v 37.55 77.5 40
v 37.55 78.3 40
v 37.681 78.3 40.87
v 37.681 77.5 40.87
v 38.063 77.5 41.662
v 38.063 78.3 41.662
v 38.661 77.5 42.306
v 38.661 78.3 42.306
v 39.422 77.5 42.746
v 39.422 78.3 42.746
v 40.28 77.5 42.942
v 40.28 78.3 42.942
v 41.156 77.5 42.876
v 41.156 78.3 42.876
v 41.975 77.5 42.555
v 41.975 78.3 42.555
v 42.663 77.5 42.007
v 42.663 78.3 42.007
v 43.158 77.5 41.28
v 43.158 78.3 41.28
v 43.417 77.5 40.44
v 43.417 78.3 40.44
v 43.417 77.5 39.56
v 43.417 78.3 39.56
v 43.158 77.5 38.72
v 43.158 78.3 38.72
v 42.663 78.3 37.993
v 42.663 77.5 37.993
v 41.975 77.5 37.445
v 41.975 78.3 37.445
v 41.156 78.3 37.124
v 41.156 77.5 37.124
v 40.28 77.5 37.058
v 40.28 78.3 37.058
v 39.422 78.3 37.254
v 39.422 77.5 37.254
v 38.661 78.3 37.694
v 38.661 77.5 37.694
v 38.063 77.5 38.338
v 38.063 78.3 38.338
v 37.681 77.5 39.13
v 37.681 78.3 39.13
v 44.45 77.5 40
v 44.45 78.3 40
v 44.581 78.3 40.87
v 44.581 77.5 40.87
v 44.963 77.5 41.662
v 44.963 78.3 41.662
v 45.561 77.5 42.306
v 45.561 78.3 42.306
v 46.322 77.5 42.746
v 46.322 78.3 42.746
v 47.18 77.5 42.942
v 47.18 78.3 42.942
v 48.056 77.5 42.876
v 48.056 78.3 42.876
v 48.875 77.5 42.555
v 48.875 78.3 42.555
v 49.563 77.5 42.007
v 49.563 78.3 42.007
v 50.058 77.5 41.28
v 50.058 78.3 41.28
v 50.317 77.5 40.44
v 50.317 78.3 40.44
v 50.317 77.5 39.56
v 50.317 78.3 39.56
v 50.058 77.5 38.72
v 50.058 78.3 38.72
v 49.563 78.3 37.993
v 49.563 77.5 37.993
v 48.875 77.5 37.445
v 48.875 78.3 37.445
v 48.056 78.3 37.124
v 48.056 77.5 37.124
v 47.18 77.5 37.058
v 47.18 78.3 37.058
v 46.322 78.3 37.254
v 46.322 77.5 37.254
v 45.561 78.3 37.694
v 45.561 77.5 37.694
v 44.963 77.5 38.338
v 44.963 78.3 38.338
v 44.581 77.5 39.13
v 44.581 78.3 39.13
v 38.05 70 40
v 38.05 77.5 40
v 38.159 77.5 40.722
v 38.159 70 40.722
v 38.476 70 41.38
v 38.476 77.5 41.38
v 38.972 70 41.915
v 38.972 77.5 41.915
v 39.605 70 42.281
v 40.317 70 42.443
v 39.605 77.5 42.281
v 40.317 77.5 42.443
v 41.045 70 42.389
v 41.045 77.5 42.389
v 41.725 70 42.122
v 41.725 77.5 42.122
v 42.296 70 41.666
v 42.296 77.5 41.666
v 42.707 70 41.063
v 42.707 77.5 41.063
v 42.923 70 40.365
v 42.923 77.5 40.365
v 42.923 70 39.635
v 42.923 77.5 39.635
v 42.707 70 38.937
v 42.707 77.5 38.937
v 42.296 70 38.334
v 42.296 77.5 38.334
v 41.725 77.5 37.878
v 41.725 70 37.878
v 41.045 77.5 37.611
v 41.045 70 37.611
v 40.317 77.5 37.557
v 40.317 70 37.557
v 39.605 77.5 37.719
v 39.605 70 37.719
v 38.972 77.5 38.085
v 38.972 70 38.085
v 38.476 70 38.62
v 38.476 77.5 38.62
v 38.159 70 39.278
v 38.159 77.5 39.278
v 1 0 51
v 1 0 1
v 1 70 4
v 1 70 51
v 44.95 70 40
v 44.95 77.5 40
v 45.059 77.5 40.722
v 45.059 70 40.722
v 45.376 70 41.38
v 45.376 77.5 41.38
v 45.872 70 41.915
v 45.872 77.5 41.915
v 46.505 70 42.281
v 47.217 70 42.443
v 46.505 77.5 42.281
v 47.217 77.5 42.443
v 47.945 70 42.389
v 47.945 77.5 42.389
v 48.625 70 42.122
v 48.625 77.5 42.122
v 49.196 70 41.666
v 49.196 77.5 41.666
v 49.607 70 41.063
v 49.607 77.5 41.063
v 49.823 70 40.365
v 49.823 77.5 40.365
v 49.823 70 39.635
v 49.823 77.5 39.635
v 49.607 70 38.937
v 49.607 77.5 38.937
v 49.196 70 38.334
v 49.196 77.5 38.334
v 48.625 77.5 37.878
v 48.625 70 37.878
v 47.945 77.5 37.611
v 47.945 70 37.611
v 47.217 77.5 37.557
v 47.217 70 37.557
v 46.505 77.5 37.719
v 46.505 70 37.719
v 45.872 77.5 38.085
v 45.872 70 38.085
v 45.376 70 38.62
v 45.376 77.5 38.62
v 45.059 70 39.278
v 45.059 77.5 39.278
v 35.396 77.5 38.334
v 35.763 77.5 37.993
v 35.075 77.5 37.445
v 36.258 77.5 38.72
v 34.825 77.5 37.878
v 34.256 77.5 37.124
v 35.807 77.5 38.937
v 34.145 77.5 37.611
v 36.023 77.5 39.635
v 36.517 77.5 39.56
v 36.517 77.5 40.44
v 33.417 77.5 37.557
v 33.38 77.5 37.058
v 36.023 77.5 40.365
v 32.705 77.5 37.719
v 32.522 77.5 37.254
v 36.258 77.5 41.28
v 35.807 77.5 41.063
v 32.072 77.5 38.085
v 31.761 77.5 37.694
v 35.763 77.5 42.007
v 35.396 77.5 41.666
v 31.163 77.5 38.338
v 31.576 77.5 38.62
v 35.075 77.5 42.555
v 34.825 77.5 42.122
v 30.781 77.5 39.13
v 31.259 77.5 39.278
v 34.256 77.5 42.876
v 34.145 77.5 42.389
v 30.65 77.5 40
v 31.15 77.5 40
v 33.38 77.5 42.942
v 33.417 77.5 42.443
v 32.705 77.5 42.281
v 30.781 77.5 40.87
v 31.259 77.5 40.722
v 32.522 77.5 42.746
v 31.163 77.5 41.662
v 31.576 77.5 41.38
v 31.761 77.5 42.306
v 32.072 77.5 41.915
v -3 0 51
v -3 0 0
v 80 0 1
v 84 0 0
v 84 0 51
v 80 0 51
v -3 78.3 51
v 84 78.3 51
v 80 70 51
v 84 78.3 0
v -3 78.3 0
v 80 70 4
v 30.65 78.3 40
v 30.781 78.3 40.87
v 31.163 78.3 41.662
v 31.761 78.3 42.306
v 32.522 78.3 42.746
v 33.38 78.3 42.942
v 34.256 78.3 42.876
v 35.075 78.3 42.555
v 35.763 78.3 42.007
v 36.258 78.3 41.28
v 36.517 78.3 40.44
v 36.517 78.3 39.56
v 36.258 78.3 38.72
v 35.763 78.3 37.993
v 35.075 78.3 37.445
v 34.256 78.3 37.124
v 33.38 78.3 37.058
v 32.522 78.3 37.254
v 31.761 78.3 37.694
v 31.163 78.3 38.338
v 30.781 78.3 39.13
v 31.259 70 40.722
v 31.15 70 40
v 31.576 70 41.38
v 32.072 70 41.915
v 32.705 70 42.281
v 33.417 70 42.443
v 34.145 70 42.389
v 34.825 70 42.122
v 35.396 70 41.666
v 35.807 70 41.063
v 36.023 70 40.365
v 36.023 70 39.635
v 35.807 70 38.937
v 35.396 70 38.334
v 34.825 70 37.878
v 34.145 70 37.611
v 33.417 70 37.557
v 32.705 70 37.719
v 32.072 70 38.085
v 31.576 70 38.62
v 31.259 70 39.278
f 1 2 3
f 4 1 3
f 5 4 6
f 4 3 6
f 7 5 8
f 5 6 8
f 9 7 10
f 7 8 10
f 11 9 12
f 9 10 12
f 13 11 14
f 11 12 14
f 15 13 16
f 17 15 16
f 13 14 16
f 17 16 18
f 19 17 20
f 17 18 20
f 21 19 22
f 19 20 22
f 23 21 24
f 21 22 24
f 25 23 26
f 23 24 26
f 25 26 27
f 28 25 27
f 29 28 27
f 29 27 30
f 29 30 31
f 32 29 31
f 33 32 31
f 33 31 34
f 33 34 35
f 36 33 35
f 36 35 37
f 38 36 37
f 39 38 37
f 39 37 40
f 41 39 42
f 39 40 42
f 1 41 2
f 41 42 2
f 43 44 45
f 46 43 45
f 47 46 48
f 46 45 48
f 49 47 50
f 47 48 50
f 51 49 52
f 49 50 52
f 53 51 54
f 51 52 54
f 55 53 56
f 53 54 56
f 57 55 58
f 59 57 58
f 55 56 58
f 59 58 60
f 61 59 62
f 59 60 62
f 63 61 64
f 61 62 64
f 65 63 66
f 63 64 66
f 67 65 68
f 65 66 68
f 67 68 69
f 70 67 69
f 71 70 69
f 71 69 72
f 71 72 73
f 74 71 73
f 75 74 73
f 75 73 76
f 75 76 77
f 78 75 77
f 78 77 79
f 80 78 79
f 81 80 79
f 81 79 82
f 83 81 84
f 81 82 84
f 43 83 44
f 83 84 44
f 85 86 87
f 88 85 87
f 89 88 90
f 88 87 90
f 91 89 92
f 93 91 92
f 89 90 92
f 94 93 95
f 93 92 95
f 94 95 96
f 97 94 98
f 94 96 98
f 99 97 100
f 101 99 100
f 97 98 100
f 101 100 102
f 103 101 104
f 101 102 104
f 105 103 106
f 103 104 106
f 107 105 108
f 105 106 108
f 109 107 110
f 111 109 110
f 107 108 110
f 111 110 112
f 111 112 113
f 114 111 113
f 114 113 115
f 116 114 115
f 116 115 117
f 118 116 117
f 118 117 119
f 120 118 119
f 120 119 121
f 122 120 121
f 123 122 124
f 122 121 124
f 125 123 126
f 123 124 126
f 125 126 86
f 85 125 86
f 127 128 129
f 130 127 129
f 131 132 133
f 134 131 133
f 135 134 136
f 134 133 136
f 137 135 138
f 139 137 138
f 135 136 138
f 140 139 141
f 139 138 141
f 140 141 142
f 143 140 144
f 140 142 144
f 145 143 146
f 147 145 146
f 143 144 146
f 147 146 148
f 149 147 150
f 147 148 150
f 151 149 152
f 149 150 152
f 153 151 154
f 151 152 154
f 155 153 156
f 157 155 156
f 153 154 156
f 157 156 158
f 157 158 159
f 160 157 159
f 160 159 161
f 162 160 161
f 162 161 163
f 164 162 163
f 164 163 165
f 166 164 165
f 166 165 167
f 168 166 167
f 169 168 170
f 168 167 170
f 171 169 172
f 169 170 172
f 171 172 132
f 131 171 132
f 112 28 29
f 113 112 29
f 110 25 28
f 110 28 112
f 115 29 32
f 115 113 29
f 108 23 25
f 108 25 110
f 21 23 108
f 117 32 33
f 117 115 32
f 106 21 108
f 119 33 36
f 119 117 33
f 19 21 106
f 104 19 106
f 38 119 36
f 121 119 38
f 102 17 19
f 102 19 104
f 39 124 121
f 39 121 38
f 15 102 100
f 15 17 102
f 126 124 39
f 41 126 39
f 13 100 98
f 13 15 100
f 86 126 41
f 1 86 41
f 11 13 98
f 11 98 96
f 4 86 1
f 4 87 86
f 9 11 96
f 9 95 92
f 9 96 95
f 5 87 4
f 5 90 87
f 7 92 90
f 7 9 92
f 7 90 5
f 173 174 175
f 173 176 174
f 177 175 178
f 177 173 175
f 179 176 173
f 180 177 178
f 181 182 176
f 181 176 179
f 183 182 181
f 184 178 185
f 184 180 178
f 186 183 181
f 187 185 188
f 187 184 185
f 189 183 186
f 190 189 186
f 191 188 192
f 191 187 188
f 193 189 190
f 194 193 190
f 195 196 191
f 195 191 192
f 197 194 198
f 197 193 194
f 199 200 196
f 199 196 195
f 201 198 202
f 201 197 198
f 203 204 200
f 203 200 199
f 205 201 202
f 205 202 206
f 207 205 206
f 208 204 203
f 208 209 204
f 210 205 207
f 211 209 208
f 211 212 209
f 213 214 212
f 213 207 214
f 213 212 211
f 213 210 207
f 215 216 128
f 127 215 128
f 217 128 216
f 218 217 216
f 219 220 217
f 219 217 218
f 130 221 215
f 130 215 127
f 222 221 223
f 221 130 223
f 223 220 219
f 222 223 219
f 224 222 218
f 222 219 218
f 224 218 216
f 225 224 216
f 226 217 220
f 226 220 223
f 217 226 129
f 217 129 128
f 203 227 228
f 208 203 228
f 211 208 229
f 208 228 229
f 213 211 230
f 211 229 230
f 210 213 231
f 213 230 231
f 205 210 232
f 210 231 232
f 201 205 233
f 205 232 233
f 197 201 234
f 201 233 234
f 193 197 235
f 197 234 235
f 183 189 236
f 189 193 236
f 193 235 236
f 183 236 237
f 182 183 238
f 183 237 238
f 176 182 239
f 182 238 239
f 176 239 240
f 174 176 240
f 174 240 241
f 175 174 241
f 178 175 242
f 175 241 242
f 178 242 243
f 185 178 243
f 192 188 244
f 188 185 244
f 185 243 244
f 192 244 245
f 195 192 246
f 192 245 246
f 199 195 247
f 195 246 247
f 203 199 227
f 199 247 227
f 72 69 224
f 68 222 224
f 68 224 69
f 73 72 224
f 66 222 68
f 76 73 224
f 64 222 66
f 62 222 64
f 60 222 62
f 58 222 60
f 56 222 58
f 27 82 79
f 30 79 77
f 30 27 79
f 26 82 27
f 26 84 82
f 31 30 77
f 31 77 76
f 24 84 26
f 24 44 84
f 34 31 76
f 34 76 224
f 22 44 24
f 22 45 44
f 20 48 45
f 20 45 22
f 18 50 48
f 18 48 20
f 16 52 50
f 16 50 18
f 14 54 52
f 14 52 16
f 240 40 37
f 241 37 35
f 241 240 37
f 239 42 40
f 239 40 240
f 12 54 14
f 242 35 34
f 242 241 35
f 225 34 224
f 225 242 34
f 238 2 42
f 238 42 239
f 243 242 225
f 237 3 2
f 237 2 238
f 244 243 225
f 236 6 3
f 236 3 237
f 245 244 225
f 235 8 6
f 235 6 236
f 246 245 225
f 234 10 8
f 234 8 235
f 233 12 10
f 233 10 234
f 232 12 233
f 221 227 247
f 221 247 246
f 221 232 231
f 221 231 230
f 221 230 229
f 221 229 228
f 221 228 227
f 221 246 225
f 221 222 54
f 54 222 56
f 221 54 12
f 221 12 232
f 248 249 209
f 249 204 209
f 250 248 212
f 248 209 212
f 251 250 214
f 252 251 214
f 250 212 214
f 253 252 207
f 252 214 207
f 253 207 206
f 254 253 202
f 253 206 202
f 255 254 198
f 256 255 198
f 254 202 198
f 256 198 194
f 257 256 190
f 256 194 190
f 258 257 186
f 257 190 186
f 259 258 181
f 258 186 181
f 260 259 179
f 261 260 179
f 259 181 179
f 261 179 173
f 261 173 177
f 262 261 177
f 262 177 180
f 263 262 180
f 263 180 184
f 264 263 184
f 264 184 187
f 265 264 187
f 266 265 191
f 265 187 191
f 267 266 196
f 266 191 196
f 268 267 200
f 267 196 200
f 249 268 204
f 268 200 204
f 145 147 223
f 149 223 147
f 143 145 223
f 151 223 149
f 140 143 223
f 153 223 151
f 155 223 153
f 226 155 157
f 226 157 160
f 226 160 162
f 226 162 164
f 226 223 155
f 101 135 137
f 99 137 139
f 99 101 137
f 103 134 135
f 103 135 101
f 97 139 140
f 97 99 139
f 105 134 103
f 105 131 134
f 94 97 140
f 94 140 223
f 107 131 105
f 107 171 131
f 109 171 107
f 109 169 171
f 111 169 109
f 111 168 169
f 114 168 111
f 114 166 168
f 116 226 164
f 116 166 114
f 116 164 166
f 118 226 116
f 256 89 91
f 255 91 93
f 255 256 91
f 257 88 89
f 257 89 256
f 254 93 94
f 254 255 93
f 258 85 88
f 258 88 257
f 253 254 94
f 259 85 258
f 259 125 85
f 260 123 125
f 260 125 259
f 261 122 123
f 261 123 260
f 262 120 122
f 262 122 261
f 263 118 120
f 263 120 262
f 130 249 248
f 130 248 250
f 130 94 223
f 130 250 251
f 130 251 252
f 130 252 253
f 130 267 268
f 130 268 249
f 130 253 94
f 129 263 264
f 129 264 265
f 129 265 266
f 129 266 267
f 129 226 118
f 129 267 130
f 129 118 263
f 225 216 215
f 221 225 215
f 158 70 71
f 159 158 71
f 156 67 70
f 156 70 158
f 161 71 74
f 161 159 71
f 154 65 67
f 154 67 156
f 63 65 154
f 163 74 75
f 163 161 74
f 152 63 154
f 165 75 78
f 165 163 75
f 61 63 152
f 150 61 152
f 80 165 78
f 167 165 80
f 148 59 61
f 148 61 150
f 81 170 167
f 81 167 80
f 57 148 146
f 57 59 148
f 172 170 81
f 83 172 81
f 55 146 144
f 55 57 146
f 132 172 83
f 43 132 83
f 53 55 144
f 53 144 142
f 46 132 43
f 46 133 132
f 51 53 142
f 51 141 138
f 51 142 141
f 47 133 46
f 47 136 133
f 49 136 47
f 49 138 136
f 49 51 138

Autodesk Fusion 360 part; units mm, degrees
sketch "Sketch1" plane through (0, 0, 0) normal (0, 0, 1) x (1, 0, 0)
  line L0 (0, 0) -> (81, 0)
  line L1 (81, 0) -> (81, 71)
  line L2 (81, 71) -> (0, 71)
  line L3 (0, 71) -> (0, 0)
  dimension "d1" = 81
  dimension "d2" = 71
extrude "Extrude1" add sketch "Sketch1" along normal blind 1
sketch "Sketch2" plane through (0, 0, 0) normal (1, 0, 0) x (0, 1, 0)
sketch "Sketch3" plane through (0, 0, 1) normal (0, 0, 1) x (-1, 0, 0)
  line L0 (0, -71) -> (0, 0)
  line L1 (0, 0) -> (-81, 0)
  line L2 (-81, 0) -> (-81, -71)
  line L3 (-81, -71) -> (0, -71)
  line L4 (0, -71) -> (-1, -71)
  line L5 (-1, -71) -> (-1, 0)
  line L6 (-1, 0) -> (0, 0)
  line L7 (0, 0) -> (0, -71)
  line L8 (-81, -71) -> (-80, -71)
  line L9 (-80, -71) -> (-80, 0)
  line L10 (-80, 0) -> (-81, 0)
  line L11 (-81, 0) -> (-81, -71)
  line L12 (-1, -71) -> (-80, -71)
  line L13 (-80, -71) -> (-80, -70)
  line L14 (-80, -70) -> (-1, -70)
  line L15 (-1, -70) -> (-1, -71)
  dimension "d5" = 1
  dimension "d6" = 1
  dimension "d7" = 1
extrude "Extrude2" add sketch "Sketch3" along normal blind 50 contours L3 L5 L9 L12 L13 L14 L15
sketch "Sketch4" plane through (0, 0, 1) normal (0, 0, 1) x (-1, 0, 0)
  line L0 (-80, -71) -> (-80, -70)
  line L1 (-80, -70) -> (-1, -70)
  line L2 (-1, -70) -> (-1, -71)
  line L3 (-1, -71) -> (0, -71)
  line L4 (0, -71) -> (0, 0)
  line L5 (0, 0) -> (-81, 0)
  line L6 (-81, 0) -> (-81, -71)
  line L7 (-81, -71) -> (-80, -71)
  line L8 (0, 0) -> (-1, 0)
  line L9 (-1, 0) -> (-1, -71)
  line L10 (-1, -71) -> (0, -71)
  line L11 (0, -71) -> (0, 0)
  dimension "d10" = 1
  dimension "d11" = 71
extrude "Extrude3" add sketch "Sketch4" along normal blind 50 contours L2 L3 L4 L5 L8 L9 L10 L11
sketch "Sketch5" plane through (0, 0, 1) normal (0, 0, 1) x (-1, 0, 0)
  line L0 (-1, -70) -> (-1, 0)
  line L1 (-1, 0) -> (-81, 0)
  line L2 (-81, 0) -> (-81, -71)
  line L3 (-81, -71) -> (-80, -71)
  line L4 (-80, -71) -> (-80, -70)
  line L5 (-80, -70) -> (-1, -70)
  line L6 (-81, 0) -> (-80, 0)
  line L7 (-80, 0) -> (-80, -71)
  line L8 (-80, -71) -> (-81, -71)
  line L9 (-81, -71) -> (-81, 0)
  dimension "d14" = 71
extrude "Extrude4" add sketch "Sketch5" along normal blind 50 contours L1 L2 L3 L4 L6 L7 L8 L9
sketch "Sketch6" plane through (0, 70, 0) normal (0, -1, 0) x (1, 0, 0)
  line L0 (1, 1) -> (80, 1)
  line L1 (80, 1) -> (80, 51)
  line L2 (80, 51) -> (1, 51)
  line L3 (1, 51) -> (1, 1)
  line L4 (80, 1) -> (80, 4)
  line L5 (1, 4) -> (1, 1)
  dimension "d17" = 79
  dimension "d18" = 3
sketch "Sketch7" plane through (0, 70, 0) normal (0, -1, 0) x (1, 0, 0)
extrude "Extrude5" cut 1 faces at (27.3333, 46.6667, 1) along direction (0, 0, -1) blind 1
sketch "Sketch8" plane through (0, 0, 0) normal (0, 1, 0) x (1, 0, 0)
sketch "Sketch9" plane through (1, 0, 0) normal (1, 0, 0) x (0, 1, 0)
  line L0 (70, 0) -> (70, 51)
  line L1 (70, 51) -> (0, 51)
  line L2 (0, 51) -> (0, 0)
  line L3 (0, 0) -> (70, 0)
  line L4 (0, 0) -> (70, 0)
  line L5 (70, 0) -> (70, 1)
  line L6 (70, 1) -> (0, 1)
  line L7 (0, 1) -> (0, 0)
  dimension "d21" = 70
  dimension "d22" = 1
extrude "Extrude6" add sketch "Sketch9" along normal blind 79 contours L0 L2 L3 L4 L5 L6 L7
sketch "Sketch10" plane through (80, 0, 0) normal (-1, 0, 0) x (0, -1, 0)
  line L0 (-70, 1) -> (0, 1)
  line L1 (0, 1) -> (0, 51)
  line L2 (0, 51) -> (-70, 51)
  line L3 (-70, 51) -> (-70, 1)
  line L4 (-70, 1) -> (-70, 4)
  line L5 (-70, 4) -> (0, 1)
  line L6 (-70, 1) -> (-70, 4)
extrude "Extrude7" add sketch "Sketch10" along normal blind 79 contours L0 L3 L4 L5 L6
sketch "Sketch11" plane through (0, 0, 0) normal (0, 0, 1) x (1, 0, 0)
  line L0 (0, 0) -> (-3, 0)
  line L1 (-3, 0) -> (-3, 74)
  line L2 (-3, 74) -> (0, 74)
  line L3 (0, 74) -> (0, 0)
  dimension "d27" = 3
  dimension "d28" = 74
extrude "Extrude8" add sketch "Sketch11" along normal blind 51
sketch "Sketch12" plane through (0, 0, 0) normal (1, 0, 0) x (0, 1, 0)
  line L0 (71, 51) -> (71, 0)
  line L1 (71, 0) -> (74, 0)
  line L2 (74, 0) -> (74, 51)
  line L3 (74, 51) -> (71, 51)
  line L4 (74, 51) -> (71, 51)
  line L5 (71, 51) -> (71, 0)
  line L6 (71, 0) -> (74, 0)
  line L7 (74, 0) -> (74, 51)
extrude "Extrude9" add sketch "Sketch12" along normal blind 84
sketch "Sketch13" plane through (0, 71, 0) normal (0, -1, 0) x (1, 0, 0)
  line L0 (81, 51) -> (81, 0)
  line L1 (81, 0) -> (84, 0)
  line L2 (84, 0) -> (84, 51)
  line L3 (84, 51) -> (81, 51)
  line L4 (81, 51) -> (84, 51)
  line L5 (84, 51) -> (84, 0)
  line L6 (84, 0) -> (81, 0)
  line L7 (81, 0) -> (81, 51)
extrude "Extrude10" add sketch "Sketch13" along normal blind 71
sketch "Sketch14" plane through (0, 74, 0) normal (0, 1, 0) x (-1, 0, 0)
  line L0 (-84, 0) -> (3, 0)
  line L1 (3, 0) -> (3, 51)
  line L2 (3, 51) -> (-84, 51)
  line L3 (-84, 51) -> (-84, 0)
extrude "Extrude11" add sketch "Sketch14" along normal blind 4.3
sketch "Sketch15" plane through (0, 78.3, 0) normal (0, 1, 0) x (-1, 0, 0)
  line L0 (-84, 51) -> (-84, 0)
  line L1 (-84, 0) -> (3, 0)
  line L2 (3, 0) -> (3, 51)
  line L3 (3, 51) -> (-84, 51)
  line L4 (-79, 40) -> (-84, 40)
  circle A0 centre (-40.5, 40) radius 2.95
  dimension "d37" = 43.5
  dimension "d38" = 5.9
extrude "Extrude12" cut sketch "Sketch15" against normal blind 0.8 contours A0
sketch "Sketch16" plane through (0, 77.5, 0) normal (0, 1, 0) x (-1, 0, 0)
  circle A0 centre (-40.5, 40) radius 2.95
  circle A1 centre (-40.5, 40) radius 2.45
  dimension "d41" = 4.9
extrude "Extrude13" cut sketch "Sketch16" against normal blind 10 contours A1
sketch "Sketch17" plane through (0, 78.3, 0) normal (0, 1, 0) x (-1, 0, 0)
  circle A0 centre (-40.5, 40) radius 2.95
  line L0 (-84, 51) -> (-84, 0)
  line L1 (-84, 0) -> (3, 0)
  line L2 (3, 0) -> (3, 51)
  line L3 (3, 51) -> (-84, 51)
  line L4 (-40.5, 42.95) -> (-40.5, 40)
  line L5 (-40.5, 40) -> (-37.55, 40)
  line L6 (-37.55, 40) -> (-36.55, 40)
  line L7 (-36.55, 40) -> (-33.6, 40)
  circle A1 centre (-33.6, 40) radius 2.95
  dimension "d44" = 2.95
  dimension "d45" = 1
  dimension "d46" = 2.95
  dimension "d47" = 5.9
extrude "Extrude14" cut sketch "Sketch17" against normal blind 0.8 contours A1
sketch "Sketch18" plane through (0, 77.5, 0) normal (0, 1, 0) x (-1, 0, 0)
  circle A0 centre (-33.6, 40) radius 2.95
  circle A1 centre (-33.6, 40) radius 2.45
  dimension "d50" = 4.9
extrude "Extrude15" cut sketch "Sketch18" against normal blind 10 contours A1
sketch "Sketch19" plane through (0, 78.3, 0) normal (0, 1, 0) x (-1, 0, 0)
  circle A0 centre (-33.6, 40) radius 2.95
  circle A1 centre (-40.5, 40) radius 2.95
  line L0 (-84, 51) -> (-84, 0)
  line L1 (-84, 0) -> (3, 0)
  line L2 (3, 0) -> (3, 51)
  line L3 (3, 51) -> (-84, 51)
  line L4 (-40.5, 40) -> (-43.45, 40)
  line L5 (-43.45, 40) -> (-44.45, 40)
  line L6 (-44.45, 40) -> (-47.4, 40)
  circle A2 centre (-47.4, 40) radius 2.95
  dimension "d53" = 2.95
  dimension "d54" = 1
  dimension "d55" = 2.95
  dimension "d57" = 5.9
extrude "Extrude16" cut sketch "Sketch19" against normal blind 0.8 contours A2
sketch "Sketch20" plane through (0, 77.5, 0) normal (0, 1, 0) x (-1, 0, 0)
  circle A0 centre (-47.4, 40) radius 2.95
  circle A1 centre (-47.4, 40) radius 2.45
  dimension "d60" = 4.9
extrude "Extrude17" cut sketch "Sketch20" against normal blind 10 contours A1
sketch "Sketch21" plane through (0, 78.3, 0) normal (0, 1, 0) x (-1, 0, 0)
  circle A0 centre (-47.4, 40) radius 2.95
  circle A1 centre (-33.6, 40) radius 2.95
  circle A2 centre (-40.5, 40) radius 2.95
  line L0 (-84, 51) -> (-84, 0)
  line L1 (-84, 0) -> (3, 0)
  line L2 (3, 0) -> (3, 51)
  line L3 (3, 51) -> (-84, 51)
equation "d37 = ( 87 / 2 ) * 1 mm"
equation "d44 = ( 5.9 / 2 ) * 1 mm"
equation "d46 = ( 5.9 / 2 ) * 1 mm"
equation "d53 = ( 5.9 / 2 ) * 1 mm"
equation "d55 = ( 5.9 / 2 ) * 1 mm"
